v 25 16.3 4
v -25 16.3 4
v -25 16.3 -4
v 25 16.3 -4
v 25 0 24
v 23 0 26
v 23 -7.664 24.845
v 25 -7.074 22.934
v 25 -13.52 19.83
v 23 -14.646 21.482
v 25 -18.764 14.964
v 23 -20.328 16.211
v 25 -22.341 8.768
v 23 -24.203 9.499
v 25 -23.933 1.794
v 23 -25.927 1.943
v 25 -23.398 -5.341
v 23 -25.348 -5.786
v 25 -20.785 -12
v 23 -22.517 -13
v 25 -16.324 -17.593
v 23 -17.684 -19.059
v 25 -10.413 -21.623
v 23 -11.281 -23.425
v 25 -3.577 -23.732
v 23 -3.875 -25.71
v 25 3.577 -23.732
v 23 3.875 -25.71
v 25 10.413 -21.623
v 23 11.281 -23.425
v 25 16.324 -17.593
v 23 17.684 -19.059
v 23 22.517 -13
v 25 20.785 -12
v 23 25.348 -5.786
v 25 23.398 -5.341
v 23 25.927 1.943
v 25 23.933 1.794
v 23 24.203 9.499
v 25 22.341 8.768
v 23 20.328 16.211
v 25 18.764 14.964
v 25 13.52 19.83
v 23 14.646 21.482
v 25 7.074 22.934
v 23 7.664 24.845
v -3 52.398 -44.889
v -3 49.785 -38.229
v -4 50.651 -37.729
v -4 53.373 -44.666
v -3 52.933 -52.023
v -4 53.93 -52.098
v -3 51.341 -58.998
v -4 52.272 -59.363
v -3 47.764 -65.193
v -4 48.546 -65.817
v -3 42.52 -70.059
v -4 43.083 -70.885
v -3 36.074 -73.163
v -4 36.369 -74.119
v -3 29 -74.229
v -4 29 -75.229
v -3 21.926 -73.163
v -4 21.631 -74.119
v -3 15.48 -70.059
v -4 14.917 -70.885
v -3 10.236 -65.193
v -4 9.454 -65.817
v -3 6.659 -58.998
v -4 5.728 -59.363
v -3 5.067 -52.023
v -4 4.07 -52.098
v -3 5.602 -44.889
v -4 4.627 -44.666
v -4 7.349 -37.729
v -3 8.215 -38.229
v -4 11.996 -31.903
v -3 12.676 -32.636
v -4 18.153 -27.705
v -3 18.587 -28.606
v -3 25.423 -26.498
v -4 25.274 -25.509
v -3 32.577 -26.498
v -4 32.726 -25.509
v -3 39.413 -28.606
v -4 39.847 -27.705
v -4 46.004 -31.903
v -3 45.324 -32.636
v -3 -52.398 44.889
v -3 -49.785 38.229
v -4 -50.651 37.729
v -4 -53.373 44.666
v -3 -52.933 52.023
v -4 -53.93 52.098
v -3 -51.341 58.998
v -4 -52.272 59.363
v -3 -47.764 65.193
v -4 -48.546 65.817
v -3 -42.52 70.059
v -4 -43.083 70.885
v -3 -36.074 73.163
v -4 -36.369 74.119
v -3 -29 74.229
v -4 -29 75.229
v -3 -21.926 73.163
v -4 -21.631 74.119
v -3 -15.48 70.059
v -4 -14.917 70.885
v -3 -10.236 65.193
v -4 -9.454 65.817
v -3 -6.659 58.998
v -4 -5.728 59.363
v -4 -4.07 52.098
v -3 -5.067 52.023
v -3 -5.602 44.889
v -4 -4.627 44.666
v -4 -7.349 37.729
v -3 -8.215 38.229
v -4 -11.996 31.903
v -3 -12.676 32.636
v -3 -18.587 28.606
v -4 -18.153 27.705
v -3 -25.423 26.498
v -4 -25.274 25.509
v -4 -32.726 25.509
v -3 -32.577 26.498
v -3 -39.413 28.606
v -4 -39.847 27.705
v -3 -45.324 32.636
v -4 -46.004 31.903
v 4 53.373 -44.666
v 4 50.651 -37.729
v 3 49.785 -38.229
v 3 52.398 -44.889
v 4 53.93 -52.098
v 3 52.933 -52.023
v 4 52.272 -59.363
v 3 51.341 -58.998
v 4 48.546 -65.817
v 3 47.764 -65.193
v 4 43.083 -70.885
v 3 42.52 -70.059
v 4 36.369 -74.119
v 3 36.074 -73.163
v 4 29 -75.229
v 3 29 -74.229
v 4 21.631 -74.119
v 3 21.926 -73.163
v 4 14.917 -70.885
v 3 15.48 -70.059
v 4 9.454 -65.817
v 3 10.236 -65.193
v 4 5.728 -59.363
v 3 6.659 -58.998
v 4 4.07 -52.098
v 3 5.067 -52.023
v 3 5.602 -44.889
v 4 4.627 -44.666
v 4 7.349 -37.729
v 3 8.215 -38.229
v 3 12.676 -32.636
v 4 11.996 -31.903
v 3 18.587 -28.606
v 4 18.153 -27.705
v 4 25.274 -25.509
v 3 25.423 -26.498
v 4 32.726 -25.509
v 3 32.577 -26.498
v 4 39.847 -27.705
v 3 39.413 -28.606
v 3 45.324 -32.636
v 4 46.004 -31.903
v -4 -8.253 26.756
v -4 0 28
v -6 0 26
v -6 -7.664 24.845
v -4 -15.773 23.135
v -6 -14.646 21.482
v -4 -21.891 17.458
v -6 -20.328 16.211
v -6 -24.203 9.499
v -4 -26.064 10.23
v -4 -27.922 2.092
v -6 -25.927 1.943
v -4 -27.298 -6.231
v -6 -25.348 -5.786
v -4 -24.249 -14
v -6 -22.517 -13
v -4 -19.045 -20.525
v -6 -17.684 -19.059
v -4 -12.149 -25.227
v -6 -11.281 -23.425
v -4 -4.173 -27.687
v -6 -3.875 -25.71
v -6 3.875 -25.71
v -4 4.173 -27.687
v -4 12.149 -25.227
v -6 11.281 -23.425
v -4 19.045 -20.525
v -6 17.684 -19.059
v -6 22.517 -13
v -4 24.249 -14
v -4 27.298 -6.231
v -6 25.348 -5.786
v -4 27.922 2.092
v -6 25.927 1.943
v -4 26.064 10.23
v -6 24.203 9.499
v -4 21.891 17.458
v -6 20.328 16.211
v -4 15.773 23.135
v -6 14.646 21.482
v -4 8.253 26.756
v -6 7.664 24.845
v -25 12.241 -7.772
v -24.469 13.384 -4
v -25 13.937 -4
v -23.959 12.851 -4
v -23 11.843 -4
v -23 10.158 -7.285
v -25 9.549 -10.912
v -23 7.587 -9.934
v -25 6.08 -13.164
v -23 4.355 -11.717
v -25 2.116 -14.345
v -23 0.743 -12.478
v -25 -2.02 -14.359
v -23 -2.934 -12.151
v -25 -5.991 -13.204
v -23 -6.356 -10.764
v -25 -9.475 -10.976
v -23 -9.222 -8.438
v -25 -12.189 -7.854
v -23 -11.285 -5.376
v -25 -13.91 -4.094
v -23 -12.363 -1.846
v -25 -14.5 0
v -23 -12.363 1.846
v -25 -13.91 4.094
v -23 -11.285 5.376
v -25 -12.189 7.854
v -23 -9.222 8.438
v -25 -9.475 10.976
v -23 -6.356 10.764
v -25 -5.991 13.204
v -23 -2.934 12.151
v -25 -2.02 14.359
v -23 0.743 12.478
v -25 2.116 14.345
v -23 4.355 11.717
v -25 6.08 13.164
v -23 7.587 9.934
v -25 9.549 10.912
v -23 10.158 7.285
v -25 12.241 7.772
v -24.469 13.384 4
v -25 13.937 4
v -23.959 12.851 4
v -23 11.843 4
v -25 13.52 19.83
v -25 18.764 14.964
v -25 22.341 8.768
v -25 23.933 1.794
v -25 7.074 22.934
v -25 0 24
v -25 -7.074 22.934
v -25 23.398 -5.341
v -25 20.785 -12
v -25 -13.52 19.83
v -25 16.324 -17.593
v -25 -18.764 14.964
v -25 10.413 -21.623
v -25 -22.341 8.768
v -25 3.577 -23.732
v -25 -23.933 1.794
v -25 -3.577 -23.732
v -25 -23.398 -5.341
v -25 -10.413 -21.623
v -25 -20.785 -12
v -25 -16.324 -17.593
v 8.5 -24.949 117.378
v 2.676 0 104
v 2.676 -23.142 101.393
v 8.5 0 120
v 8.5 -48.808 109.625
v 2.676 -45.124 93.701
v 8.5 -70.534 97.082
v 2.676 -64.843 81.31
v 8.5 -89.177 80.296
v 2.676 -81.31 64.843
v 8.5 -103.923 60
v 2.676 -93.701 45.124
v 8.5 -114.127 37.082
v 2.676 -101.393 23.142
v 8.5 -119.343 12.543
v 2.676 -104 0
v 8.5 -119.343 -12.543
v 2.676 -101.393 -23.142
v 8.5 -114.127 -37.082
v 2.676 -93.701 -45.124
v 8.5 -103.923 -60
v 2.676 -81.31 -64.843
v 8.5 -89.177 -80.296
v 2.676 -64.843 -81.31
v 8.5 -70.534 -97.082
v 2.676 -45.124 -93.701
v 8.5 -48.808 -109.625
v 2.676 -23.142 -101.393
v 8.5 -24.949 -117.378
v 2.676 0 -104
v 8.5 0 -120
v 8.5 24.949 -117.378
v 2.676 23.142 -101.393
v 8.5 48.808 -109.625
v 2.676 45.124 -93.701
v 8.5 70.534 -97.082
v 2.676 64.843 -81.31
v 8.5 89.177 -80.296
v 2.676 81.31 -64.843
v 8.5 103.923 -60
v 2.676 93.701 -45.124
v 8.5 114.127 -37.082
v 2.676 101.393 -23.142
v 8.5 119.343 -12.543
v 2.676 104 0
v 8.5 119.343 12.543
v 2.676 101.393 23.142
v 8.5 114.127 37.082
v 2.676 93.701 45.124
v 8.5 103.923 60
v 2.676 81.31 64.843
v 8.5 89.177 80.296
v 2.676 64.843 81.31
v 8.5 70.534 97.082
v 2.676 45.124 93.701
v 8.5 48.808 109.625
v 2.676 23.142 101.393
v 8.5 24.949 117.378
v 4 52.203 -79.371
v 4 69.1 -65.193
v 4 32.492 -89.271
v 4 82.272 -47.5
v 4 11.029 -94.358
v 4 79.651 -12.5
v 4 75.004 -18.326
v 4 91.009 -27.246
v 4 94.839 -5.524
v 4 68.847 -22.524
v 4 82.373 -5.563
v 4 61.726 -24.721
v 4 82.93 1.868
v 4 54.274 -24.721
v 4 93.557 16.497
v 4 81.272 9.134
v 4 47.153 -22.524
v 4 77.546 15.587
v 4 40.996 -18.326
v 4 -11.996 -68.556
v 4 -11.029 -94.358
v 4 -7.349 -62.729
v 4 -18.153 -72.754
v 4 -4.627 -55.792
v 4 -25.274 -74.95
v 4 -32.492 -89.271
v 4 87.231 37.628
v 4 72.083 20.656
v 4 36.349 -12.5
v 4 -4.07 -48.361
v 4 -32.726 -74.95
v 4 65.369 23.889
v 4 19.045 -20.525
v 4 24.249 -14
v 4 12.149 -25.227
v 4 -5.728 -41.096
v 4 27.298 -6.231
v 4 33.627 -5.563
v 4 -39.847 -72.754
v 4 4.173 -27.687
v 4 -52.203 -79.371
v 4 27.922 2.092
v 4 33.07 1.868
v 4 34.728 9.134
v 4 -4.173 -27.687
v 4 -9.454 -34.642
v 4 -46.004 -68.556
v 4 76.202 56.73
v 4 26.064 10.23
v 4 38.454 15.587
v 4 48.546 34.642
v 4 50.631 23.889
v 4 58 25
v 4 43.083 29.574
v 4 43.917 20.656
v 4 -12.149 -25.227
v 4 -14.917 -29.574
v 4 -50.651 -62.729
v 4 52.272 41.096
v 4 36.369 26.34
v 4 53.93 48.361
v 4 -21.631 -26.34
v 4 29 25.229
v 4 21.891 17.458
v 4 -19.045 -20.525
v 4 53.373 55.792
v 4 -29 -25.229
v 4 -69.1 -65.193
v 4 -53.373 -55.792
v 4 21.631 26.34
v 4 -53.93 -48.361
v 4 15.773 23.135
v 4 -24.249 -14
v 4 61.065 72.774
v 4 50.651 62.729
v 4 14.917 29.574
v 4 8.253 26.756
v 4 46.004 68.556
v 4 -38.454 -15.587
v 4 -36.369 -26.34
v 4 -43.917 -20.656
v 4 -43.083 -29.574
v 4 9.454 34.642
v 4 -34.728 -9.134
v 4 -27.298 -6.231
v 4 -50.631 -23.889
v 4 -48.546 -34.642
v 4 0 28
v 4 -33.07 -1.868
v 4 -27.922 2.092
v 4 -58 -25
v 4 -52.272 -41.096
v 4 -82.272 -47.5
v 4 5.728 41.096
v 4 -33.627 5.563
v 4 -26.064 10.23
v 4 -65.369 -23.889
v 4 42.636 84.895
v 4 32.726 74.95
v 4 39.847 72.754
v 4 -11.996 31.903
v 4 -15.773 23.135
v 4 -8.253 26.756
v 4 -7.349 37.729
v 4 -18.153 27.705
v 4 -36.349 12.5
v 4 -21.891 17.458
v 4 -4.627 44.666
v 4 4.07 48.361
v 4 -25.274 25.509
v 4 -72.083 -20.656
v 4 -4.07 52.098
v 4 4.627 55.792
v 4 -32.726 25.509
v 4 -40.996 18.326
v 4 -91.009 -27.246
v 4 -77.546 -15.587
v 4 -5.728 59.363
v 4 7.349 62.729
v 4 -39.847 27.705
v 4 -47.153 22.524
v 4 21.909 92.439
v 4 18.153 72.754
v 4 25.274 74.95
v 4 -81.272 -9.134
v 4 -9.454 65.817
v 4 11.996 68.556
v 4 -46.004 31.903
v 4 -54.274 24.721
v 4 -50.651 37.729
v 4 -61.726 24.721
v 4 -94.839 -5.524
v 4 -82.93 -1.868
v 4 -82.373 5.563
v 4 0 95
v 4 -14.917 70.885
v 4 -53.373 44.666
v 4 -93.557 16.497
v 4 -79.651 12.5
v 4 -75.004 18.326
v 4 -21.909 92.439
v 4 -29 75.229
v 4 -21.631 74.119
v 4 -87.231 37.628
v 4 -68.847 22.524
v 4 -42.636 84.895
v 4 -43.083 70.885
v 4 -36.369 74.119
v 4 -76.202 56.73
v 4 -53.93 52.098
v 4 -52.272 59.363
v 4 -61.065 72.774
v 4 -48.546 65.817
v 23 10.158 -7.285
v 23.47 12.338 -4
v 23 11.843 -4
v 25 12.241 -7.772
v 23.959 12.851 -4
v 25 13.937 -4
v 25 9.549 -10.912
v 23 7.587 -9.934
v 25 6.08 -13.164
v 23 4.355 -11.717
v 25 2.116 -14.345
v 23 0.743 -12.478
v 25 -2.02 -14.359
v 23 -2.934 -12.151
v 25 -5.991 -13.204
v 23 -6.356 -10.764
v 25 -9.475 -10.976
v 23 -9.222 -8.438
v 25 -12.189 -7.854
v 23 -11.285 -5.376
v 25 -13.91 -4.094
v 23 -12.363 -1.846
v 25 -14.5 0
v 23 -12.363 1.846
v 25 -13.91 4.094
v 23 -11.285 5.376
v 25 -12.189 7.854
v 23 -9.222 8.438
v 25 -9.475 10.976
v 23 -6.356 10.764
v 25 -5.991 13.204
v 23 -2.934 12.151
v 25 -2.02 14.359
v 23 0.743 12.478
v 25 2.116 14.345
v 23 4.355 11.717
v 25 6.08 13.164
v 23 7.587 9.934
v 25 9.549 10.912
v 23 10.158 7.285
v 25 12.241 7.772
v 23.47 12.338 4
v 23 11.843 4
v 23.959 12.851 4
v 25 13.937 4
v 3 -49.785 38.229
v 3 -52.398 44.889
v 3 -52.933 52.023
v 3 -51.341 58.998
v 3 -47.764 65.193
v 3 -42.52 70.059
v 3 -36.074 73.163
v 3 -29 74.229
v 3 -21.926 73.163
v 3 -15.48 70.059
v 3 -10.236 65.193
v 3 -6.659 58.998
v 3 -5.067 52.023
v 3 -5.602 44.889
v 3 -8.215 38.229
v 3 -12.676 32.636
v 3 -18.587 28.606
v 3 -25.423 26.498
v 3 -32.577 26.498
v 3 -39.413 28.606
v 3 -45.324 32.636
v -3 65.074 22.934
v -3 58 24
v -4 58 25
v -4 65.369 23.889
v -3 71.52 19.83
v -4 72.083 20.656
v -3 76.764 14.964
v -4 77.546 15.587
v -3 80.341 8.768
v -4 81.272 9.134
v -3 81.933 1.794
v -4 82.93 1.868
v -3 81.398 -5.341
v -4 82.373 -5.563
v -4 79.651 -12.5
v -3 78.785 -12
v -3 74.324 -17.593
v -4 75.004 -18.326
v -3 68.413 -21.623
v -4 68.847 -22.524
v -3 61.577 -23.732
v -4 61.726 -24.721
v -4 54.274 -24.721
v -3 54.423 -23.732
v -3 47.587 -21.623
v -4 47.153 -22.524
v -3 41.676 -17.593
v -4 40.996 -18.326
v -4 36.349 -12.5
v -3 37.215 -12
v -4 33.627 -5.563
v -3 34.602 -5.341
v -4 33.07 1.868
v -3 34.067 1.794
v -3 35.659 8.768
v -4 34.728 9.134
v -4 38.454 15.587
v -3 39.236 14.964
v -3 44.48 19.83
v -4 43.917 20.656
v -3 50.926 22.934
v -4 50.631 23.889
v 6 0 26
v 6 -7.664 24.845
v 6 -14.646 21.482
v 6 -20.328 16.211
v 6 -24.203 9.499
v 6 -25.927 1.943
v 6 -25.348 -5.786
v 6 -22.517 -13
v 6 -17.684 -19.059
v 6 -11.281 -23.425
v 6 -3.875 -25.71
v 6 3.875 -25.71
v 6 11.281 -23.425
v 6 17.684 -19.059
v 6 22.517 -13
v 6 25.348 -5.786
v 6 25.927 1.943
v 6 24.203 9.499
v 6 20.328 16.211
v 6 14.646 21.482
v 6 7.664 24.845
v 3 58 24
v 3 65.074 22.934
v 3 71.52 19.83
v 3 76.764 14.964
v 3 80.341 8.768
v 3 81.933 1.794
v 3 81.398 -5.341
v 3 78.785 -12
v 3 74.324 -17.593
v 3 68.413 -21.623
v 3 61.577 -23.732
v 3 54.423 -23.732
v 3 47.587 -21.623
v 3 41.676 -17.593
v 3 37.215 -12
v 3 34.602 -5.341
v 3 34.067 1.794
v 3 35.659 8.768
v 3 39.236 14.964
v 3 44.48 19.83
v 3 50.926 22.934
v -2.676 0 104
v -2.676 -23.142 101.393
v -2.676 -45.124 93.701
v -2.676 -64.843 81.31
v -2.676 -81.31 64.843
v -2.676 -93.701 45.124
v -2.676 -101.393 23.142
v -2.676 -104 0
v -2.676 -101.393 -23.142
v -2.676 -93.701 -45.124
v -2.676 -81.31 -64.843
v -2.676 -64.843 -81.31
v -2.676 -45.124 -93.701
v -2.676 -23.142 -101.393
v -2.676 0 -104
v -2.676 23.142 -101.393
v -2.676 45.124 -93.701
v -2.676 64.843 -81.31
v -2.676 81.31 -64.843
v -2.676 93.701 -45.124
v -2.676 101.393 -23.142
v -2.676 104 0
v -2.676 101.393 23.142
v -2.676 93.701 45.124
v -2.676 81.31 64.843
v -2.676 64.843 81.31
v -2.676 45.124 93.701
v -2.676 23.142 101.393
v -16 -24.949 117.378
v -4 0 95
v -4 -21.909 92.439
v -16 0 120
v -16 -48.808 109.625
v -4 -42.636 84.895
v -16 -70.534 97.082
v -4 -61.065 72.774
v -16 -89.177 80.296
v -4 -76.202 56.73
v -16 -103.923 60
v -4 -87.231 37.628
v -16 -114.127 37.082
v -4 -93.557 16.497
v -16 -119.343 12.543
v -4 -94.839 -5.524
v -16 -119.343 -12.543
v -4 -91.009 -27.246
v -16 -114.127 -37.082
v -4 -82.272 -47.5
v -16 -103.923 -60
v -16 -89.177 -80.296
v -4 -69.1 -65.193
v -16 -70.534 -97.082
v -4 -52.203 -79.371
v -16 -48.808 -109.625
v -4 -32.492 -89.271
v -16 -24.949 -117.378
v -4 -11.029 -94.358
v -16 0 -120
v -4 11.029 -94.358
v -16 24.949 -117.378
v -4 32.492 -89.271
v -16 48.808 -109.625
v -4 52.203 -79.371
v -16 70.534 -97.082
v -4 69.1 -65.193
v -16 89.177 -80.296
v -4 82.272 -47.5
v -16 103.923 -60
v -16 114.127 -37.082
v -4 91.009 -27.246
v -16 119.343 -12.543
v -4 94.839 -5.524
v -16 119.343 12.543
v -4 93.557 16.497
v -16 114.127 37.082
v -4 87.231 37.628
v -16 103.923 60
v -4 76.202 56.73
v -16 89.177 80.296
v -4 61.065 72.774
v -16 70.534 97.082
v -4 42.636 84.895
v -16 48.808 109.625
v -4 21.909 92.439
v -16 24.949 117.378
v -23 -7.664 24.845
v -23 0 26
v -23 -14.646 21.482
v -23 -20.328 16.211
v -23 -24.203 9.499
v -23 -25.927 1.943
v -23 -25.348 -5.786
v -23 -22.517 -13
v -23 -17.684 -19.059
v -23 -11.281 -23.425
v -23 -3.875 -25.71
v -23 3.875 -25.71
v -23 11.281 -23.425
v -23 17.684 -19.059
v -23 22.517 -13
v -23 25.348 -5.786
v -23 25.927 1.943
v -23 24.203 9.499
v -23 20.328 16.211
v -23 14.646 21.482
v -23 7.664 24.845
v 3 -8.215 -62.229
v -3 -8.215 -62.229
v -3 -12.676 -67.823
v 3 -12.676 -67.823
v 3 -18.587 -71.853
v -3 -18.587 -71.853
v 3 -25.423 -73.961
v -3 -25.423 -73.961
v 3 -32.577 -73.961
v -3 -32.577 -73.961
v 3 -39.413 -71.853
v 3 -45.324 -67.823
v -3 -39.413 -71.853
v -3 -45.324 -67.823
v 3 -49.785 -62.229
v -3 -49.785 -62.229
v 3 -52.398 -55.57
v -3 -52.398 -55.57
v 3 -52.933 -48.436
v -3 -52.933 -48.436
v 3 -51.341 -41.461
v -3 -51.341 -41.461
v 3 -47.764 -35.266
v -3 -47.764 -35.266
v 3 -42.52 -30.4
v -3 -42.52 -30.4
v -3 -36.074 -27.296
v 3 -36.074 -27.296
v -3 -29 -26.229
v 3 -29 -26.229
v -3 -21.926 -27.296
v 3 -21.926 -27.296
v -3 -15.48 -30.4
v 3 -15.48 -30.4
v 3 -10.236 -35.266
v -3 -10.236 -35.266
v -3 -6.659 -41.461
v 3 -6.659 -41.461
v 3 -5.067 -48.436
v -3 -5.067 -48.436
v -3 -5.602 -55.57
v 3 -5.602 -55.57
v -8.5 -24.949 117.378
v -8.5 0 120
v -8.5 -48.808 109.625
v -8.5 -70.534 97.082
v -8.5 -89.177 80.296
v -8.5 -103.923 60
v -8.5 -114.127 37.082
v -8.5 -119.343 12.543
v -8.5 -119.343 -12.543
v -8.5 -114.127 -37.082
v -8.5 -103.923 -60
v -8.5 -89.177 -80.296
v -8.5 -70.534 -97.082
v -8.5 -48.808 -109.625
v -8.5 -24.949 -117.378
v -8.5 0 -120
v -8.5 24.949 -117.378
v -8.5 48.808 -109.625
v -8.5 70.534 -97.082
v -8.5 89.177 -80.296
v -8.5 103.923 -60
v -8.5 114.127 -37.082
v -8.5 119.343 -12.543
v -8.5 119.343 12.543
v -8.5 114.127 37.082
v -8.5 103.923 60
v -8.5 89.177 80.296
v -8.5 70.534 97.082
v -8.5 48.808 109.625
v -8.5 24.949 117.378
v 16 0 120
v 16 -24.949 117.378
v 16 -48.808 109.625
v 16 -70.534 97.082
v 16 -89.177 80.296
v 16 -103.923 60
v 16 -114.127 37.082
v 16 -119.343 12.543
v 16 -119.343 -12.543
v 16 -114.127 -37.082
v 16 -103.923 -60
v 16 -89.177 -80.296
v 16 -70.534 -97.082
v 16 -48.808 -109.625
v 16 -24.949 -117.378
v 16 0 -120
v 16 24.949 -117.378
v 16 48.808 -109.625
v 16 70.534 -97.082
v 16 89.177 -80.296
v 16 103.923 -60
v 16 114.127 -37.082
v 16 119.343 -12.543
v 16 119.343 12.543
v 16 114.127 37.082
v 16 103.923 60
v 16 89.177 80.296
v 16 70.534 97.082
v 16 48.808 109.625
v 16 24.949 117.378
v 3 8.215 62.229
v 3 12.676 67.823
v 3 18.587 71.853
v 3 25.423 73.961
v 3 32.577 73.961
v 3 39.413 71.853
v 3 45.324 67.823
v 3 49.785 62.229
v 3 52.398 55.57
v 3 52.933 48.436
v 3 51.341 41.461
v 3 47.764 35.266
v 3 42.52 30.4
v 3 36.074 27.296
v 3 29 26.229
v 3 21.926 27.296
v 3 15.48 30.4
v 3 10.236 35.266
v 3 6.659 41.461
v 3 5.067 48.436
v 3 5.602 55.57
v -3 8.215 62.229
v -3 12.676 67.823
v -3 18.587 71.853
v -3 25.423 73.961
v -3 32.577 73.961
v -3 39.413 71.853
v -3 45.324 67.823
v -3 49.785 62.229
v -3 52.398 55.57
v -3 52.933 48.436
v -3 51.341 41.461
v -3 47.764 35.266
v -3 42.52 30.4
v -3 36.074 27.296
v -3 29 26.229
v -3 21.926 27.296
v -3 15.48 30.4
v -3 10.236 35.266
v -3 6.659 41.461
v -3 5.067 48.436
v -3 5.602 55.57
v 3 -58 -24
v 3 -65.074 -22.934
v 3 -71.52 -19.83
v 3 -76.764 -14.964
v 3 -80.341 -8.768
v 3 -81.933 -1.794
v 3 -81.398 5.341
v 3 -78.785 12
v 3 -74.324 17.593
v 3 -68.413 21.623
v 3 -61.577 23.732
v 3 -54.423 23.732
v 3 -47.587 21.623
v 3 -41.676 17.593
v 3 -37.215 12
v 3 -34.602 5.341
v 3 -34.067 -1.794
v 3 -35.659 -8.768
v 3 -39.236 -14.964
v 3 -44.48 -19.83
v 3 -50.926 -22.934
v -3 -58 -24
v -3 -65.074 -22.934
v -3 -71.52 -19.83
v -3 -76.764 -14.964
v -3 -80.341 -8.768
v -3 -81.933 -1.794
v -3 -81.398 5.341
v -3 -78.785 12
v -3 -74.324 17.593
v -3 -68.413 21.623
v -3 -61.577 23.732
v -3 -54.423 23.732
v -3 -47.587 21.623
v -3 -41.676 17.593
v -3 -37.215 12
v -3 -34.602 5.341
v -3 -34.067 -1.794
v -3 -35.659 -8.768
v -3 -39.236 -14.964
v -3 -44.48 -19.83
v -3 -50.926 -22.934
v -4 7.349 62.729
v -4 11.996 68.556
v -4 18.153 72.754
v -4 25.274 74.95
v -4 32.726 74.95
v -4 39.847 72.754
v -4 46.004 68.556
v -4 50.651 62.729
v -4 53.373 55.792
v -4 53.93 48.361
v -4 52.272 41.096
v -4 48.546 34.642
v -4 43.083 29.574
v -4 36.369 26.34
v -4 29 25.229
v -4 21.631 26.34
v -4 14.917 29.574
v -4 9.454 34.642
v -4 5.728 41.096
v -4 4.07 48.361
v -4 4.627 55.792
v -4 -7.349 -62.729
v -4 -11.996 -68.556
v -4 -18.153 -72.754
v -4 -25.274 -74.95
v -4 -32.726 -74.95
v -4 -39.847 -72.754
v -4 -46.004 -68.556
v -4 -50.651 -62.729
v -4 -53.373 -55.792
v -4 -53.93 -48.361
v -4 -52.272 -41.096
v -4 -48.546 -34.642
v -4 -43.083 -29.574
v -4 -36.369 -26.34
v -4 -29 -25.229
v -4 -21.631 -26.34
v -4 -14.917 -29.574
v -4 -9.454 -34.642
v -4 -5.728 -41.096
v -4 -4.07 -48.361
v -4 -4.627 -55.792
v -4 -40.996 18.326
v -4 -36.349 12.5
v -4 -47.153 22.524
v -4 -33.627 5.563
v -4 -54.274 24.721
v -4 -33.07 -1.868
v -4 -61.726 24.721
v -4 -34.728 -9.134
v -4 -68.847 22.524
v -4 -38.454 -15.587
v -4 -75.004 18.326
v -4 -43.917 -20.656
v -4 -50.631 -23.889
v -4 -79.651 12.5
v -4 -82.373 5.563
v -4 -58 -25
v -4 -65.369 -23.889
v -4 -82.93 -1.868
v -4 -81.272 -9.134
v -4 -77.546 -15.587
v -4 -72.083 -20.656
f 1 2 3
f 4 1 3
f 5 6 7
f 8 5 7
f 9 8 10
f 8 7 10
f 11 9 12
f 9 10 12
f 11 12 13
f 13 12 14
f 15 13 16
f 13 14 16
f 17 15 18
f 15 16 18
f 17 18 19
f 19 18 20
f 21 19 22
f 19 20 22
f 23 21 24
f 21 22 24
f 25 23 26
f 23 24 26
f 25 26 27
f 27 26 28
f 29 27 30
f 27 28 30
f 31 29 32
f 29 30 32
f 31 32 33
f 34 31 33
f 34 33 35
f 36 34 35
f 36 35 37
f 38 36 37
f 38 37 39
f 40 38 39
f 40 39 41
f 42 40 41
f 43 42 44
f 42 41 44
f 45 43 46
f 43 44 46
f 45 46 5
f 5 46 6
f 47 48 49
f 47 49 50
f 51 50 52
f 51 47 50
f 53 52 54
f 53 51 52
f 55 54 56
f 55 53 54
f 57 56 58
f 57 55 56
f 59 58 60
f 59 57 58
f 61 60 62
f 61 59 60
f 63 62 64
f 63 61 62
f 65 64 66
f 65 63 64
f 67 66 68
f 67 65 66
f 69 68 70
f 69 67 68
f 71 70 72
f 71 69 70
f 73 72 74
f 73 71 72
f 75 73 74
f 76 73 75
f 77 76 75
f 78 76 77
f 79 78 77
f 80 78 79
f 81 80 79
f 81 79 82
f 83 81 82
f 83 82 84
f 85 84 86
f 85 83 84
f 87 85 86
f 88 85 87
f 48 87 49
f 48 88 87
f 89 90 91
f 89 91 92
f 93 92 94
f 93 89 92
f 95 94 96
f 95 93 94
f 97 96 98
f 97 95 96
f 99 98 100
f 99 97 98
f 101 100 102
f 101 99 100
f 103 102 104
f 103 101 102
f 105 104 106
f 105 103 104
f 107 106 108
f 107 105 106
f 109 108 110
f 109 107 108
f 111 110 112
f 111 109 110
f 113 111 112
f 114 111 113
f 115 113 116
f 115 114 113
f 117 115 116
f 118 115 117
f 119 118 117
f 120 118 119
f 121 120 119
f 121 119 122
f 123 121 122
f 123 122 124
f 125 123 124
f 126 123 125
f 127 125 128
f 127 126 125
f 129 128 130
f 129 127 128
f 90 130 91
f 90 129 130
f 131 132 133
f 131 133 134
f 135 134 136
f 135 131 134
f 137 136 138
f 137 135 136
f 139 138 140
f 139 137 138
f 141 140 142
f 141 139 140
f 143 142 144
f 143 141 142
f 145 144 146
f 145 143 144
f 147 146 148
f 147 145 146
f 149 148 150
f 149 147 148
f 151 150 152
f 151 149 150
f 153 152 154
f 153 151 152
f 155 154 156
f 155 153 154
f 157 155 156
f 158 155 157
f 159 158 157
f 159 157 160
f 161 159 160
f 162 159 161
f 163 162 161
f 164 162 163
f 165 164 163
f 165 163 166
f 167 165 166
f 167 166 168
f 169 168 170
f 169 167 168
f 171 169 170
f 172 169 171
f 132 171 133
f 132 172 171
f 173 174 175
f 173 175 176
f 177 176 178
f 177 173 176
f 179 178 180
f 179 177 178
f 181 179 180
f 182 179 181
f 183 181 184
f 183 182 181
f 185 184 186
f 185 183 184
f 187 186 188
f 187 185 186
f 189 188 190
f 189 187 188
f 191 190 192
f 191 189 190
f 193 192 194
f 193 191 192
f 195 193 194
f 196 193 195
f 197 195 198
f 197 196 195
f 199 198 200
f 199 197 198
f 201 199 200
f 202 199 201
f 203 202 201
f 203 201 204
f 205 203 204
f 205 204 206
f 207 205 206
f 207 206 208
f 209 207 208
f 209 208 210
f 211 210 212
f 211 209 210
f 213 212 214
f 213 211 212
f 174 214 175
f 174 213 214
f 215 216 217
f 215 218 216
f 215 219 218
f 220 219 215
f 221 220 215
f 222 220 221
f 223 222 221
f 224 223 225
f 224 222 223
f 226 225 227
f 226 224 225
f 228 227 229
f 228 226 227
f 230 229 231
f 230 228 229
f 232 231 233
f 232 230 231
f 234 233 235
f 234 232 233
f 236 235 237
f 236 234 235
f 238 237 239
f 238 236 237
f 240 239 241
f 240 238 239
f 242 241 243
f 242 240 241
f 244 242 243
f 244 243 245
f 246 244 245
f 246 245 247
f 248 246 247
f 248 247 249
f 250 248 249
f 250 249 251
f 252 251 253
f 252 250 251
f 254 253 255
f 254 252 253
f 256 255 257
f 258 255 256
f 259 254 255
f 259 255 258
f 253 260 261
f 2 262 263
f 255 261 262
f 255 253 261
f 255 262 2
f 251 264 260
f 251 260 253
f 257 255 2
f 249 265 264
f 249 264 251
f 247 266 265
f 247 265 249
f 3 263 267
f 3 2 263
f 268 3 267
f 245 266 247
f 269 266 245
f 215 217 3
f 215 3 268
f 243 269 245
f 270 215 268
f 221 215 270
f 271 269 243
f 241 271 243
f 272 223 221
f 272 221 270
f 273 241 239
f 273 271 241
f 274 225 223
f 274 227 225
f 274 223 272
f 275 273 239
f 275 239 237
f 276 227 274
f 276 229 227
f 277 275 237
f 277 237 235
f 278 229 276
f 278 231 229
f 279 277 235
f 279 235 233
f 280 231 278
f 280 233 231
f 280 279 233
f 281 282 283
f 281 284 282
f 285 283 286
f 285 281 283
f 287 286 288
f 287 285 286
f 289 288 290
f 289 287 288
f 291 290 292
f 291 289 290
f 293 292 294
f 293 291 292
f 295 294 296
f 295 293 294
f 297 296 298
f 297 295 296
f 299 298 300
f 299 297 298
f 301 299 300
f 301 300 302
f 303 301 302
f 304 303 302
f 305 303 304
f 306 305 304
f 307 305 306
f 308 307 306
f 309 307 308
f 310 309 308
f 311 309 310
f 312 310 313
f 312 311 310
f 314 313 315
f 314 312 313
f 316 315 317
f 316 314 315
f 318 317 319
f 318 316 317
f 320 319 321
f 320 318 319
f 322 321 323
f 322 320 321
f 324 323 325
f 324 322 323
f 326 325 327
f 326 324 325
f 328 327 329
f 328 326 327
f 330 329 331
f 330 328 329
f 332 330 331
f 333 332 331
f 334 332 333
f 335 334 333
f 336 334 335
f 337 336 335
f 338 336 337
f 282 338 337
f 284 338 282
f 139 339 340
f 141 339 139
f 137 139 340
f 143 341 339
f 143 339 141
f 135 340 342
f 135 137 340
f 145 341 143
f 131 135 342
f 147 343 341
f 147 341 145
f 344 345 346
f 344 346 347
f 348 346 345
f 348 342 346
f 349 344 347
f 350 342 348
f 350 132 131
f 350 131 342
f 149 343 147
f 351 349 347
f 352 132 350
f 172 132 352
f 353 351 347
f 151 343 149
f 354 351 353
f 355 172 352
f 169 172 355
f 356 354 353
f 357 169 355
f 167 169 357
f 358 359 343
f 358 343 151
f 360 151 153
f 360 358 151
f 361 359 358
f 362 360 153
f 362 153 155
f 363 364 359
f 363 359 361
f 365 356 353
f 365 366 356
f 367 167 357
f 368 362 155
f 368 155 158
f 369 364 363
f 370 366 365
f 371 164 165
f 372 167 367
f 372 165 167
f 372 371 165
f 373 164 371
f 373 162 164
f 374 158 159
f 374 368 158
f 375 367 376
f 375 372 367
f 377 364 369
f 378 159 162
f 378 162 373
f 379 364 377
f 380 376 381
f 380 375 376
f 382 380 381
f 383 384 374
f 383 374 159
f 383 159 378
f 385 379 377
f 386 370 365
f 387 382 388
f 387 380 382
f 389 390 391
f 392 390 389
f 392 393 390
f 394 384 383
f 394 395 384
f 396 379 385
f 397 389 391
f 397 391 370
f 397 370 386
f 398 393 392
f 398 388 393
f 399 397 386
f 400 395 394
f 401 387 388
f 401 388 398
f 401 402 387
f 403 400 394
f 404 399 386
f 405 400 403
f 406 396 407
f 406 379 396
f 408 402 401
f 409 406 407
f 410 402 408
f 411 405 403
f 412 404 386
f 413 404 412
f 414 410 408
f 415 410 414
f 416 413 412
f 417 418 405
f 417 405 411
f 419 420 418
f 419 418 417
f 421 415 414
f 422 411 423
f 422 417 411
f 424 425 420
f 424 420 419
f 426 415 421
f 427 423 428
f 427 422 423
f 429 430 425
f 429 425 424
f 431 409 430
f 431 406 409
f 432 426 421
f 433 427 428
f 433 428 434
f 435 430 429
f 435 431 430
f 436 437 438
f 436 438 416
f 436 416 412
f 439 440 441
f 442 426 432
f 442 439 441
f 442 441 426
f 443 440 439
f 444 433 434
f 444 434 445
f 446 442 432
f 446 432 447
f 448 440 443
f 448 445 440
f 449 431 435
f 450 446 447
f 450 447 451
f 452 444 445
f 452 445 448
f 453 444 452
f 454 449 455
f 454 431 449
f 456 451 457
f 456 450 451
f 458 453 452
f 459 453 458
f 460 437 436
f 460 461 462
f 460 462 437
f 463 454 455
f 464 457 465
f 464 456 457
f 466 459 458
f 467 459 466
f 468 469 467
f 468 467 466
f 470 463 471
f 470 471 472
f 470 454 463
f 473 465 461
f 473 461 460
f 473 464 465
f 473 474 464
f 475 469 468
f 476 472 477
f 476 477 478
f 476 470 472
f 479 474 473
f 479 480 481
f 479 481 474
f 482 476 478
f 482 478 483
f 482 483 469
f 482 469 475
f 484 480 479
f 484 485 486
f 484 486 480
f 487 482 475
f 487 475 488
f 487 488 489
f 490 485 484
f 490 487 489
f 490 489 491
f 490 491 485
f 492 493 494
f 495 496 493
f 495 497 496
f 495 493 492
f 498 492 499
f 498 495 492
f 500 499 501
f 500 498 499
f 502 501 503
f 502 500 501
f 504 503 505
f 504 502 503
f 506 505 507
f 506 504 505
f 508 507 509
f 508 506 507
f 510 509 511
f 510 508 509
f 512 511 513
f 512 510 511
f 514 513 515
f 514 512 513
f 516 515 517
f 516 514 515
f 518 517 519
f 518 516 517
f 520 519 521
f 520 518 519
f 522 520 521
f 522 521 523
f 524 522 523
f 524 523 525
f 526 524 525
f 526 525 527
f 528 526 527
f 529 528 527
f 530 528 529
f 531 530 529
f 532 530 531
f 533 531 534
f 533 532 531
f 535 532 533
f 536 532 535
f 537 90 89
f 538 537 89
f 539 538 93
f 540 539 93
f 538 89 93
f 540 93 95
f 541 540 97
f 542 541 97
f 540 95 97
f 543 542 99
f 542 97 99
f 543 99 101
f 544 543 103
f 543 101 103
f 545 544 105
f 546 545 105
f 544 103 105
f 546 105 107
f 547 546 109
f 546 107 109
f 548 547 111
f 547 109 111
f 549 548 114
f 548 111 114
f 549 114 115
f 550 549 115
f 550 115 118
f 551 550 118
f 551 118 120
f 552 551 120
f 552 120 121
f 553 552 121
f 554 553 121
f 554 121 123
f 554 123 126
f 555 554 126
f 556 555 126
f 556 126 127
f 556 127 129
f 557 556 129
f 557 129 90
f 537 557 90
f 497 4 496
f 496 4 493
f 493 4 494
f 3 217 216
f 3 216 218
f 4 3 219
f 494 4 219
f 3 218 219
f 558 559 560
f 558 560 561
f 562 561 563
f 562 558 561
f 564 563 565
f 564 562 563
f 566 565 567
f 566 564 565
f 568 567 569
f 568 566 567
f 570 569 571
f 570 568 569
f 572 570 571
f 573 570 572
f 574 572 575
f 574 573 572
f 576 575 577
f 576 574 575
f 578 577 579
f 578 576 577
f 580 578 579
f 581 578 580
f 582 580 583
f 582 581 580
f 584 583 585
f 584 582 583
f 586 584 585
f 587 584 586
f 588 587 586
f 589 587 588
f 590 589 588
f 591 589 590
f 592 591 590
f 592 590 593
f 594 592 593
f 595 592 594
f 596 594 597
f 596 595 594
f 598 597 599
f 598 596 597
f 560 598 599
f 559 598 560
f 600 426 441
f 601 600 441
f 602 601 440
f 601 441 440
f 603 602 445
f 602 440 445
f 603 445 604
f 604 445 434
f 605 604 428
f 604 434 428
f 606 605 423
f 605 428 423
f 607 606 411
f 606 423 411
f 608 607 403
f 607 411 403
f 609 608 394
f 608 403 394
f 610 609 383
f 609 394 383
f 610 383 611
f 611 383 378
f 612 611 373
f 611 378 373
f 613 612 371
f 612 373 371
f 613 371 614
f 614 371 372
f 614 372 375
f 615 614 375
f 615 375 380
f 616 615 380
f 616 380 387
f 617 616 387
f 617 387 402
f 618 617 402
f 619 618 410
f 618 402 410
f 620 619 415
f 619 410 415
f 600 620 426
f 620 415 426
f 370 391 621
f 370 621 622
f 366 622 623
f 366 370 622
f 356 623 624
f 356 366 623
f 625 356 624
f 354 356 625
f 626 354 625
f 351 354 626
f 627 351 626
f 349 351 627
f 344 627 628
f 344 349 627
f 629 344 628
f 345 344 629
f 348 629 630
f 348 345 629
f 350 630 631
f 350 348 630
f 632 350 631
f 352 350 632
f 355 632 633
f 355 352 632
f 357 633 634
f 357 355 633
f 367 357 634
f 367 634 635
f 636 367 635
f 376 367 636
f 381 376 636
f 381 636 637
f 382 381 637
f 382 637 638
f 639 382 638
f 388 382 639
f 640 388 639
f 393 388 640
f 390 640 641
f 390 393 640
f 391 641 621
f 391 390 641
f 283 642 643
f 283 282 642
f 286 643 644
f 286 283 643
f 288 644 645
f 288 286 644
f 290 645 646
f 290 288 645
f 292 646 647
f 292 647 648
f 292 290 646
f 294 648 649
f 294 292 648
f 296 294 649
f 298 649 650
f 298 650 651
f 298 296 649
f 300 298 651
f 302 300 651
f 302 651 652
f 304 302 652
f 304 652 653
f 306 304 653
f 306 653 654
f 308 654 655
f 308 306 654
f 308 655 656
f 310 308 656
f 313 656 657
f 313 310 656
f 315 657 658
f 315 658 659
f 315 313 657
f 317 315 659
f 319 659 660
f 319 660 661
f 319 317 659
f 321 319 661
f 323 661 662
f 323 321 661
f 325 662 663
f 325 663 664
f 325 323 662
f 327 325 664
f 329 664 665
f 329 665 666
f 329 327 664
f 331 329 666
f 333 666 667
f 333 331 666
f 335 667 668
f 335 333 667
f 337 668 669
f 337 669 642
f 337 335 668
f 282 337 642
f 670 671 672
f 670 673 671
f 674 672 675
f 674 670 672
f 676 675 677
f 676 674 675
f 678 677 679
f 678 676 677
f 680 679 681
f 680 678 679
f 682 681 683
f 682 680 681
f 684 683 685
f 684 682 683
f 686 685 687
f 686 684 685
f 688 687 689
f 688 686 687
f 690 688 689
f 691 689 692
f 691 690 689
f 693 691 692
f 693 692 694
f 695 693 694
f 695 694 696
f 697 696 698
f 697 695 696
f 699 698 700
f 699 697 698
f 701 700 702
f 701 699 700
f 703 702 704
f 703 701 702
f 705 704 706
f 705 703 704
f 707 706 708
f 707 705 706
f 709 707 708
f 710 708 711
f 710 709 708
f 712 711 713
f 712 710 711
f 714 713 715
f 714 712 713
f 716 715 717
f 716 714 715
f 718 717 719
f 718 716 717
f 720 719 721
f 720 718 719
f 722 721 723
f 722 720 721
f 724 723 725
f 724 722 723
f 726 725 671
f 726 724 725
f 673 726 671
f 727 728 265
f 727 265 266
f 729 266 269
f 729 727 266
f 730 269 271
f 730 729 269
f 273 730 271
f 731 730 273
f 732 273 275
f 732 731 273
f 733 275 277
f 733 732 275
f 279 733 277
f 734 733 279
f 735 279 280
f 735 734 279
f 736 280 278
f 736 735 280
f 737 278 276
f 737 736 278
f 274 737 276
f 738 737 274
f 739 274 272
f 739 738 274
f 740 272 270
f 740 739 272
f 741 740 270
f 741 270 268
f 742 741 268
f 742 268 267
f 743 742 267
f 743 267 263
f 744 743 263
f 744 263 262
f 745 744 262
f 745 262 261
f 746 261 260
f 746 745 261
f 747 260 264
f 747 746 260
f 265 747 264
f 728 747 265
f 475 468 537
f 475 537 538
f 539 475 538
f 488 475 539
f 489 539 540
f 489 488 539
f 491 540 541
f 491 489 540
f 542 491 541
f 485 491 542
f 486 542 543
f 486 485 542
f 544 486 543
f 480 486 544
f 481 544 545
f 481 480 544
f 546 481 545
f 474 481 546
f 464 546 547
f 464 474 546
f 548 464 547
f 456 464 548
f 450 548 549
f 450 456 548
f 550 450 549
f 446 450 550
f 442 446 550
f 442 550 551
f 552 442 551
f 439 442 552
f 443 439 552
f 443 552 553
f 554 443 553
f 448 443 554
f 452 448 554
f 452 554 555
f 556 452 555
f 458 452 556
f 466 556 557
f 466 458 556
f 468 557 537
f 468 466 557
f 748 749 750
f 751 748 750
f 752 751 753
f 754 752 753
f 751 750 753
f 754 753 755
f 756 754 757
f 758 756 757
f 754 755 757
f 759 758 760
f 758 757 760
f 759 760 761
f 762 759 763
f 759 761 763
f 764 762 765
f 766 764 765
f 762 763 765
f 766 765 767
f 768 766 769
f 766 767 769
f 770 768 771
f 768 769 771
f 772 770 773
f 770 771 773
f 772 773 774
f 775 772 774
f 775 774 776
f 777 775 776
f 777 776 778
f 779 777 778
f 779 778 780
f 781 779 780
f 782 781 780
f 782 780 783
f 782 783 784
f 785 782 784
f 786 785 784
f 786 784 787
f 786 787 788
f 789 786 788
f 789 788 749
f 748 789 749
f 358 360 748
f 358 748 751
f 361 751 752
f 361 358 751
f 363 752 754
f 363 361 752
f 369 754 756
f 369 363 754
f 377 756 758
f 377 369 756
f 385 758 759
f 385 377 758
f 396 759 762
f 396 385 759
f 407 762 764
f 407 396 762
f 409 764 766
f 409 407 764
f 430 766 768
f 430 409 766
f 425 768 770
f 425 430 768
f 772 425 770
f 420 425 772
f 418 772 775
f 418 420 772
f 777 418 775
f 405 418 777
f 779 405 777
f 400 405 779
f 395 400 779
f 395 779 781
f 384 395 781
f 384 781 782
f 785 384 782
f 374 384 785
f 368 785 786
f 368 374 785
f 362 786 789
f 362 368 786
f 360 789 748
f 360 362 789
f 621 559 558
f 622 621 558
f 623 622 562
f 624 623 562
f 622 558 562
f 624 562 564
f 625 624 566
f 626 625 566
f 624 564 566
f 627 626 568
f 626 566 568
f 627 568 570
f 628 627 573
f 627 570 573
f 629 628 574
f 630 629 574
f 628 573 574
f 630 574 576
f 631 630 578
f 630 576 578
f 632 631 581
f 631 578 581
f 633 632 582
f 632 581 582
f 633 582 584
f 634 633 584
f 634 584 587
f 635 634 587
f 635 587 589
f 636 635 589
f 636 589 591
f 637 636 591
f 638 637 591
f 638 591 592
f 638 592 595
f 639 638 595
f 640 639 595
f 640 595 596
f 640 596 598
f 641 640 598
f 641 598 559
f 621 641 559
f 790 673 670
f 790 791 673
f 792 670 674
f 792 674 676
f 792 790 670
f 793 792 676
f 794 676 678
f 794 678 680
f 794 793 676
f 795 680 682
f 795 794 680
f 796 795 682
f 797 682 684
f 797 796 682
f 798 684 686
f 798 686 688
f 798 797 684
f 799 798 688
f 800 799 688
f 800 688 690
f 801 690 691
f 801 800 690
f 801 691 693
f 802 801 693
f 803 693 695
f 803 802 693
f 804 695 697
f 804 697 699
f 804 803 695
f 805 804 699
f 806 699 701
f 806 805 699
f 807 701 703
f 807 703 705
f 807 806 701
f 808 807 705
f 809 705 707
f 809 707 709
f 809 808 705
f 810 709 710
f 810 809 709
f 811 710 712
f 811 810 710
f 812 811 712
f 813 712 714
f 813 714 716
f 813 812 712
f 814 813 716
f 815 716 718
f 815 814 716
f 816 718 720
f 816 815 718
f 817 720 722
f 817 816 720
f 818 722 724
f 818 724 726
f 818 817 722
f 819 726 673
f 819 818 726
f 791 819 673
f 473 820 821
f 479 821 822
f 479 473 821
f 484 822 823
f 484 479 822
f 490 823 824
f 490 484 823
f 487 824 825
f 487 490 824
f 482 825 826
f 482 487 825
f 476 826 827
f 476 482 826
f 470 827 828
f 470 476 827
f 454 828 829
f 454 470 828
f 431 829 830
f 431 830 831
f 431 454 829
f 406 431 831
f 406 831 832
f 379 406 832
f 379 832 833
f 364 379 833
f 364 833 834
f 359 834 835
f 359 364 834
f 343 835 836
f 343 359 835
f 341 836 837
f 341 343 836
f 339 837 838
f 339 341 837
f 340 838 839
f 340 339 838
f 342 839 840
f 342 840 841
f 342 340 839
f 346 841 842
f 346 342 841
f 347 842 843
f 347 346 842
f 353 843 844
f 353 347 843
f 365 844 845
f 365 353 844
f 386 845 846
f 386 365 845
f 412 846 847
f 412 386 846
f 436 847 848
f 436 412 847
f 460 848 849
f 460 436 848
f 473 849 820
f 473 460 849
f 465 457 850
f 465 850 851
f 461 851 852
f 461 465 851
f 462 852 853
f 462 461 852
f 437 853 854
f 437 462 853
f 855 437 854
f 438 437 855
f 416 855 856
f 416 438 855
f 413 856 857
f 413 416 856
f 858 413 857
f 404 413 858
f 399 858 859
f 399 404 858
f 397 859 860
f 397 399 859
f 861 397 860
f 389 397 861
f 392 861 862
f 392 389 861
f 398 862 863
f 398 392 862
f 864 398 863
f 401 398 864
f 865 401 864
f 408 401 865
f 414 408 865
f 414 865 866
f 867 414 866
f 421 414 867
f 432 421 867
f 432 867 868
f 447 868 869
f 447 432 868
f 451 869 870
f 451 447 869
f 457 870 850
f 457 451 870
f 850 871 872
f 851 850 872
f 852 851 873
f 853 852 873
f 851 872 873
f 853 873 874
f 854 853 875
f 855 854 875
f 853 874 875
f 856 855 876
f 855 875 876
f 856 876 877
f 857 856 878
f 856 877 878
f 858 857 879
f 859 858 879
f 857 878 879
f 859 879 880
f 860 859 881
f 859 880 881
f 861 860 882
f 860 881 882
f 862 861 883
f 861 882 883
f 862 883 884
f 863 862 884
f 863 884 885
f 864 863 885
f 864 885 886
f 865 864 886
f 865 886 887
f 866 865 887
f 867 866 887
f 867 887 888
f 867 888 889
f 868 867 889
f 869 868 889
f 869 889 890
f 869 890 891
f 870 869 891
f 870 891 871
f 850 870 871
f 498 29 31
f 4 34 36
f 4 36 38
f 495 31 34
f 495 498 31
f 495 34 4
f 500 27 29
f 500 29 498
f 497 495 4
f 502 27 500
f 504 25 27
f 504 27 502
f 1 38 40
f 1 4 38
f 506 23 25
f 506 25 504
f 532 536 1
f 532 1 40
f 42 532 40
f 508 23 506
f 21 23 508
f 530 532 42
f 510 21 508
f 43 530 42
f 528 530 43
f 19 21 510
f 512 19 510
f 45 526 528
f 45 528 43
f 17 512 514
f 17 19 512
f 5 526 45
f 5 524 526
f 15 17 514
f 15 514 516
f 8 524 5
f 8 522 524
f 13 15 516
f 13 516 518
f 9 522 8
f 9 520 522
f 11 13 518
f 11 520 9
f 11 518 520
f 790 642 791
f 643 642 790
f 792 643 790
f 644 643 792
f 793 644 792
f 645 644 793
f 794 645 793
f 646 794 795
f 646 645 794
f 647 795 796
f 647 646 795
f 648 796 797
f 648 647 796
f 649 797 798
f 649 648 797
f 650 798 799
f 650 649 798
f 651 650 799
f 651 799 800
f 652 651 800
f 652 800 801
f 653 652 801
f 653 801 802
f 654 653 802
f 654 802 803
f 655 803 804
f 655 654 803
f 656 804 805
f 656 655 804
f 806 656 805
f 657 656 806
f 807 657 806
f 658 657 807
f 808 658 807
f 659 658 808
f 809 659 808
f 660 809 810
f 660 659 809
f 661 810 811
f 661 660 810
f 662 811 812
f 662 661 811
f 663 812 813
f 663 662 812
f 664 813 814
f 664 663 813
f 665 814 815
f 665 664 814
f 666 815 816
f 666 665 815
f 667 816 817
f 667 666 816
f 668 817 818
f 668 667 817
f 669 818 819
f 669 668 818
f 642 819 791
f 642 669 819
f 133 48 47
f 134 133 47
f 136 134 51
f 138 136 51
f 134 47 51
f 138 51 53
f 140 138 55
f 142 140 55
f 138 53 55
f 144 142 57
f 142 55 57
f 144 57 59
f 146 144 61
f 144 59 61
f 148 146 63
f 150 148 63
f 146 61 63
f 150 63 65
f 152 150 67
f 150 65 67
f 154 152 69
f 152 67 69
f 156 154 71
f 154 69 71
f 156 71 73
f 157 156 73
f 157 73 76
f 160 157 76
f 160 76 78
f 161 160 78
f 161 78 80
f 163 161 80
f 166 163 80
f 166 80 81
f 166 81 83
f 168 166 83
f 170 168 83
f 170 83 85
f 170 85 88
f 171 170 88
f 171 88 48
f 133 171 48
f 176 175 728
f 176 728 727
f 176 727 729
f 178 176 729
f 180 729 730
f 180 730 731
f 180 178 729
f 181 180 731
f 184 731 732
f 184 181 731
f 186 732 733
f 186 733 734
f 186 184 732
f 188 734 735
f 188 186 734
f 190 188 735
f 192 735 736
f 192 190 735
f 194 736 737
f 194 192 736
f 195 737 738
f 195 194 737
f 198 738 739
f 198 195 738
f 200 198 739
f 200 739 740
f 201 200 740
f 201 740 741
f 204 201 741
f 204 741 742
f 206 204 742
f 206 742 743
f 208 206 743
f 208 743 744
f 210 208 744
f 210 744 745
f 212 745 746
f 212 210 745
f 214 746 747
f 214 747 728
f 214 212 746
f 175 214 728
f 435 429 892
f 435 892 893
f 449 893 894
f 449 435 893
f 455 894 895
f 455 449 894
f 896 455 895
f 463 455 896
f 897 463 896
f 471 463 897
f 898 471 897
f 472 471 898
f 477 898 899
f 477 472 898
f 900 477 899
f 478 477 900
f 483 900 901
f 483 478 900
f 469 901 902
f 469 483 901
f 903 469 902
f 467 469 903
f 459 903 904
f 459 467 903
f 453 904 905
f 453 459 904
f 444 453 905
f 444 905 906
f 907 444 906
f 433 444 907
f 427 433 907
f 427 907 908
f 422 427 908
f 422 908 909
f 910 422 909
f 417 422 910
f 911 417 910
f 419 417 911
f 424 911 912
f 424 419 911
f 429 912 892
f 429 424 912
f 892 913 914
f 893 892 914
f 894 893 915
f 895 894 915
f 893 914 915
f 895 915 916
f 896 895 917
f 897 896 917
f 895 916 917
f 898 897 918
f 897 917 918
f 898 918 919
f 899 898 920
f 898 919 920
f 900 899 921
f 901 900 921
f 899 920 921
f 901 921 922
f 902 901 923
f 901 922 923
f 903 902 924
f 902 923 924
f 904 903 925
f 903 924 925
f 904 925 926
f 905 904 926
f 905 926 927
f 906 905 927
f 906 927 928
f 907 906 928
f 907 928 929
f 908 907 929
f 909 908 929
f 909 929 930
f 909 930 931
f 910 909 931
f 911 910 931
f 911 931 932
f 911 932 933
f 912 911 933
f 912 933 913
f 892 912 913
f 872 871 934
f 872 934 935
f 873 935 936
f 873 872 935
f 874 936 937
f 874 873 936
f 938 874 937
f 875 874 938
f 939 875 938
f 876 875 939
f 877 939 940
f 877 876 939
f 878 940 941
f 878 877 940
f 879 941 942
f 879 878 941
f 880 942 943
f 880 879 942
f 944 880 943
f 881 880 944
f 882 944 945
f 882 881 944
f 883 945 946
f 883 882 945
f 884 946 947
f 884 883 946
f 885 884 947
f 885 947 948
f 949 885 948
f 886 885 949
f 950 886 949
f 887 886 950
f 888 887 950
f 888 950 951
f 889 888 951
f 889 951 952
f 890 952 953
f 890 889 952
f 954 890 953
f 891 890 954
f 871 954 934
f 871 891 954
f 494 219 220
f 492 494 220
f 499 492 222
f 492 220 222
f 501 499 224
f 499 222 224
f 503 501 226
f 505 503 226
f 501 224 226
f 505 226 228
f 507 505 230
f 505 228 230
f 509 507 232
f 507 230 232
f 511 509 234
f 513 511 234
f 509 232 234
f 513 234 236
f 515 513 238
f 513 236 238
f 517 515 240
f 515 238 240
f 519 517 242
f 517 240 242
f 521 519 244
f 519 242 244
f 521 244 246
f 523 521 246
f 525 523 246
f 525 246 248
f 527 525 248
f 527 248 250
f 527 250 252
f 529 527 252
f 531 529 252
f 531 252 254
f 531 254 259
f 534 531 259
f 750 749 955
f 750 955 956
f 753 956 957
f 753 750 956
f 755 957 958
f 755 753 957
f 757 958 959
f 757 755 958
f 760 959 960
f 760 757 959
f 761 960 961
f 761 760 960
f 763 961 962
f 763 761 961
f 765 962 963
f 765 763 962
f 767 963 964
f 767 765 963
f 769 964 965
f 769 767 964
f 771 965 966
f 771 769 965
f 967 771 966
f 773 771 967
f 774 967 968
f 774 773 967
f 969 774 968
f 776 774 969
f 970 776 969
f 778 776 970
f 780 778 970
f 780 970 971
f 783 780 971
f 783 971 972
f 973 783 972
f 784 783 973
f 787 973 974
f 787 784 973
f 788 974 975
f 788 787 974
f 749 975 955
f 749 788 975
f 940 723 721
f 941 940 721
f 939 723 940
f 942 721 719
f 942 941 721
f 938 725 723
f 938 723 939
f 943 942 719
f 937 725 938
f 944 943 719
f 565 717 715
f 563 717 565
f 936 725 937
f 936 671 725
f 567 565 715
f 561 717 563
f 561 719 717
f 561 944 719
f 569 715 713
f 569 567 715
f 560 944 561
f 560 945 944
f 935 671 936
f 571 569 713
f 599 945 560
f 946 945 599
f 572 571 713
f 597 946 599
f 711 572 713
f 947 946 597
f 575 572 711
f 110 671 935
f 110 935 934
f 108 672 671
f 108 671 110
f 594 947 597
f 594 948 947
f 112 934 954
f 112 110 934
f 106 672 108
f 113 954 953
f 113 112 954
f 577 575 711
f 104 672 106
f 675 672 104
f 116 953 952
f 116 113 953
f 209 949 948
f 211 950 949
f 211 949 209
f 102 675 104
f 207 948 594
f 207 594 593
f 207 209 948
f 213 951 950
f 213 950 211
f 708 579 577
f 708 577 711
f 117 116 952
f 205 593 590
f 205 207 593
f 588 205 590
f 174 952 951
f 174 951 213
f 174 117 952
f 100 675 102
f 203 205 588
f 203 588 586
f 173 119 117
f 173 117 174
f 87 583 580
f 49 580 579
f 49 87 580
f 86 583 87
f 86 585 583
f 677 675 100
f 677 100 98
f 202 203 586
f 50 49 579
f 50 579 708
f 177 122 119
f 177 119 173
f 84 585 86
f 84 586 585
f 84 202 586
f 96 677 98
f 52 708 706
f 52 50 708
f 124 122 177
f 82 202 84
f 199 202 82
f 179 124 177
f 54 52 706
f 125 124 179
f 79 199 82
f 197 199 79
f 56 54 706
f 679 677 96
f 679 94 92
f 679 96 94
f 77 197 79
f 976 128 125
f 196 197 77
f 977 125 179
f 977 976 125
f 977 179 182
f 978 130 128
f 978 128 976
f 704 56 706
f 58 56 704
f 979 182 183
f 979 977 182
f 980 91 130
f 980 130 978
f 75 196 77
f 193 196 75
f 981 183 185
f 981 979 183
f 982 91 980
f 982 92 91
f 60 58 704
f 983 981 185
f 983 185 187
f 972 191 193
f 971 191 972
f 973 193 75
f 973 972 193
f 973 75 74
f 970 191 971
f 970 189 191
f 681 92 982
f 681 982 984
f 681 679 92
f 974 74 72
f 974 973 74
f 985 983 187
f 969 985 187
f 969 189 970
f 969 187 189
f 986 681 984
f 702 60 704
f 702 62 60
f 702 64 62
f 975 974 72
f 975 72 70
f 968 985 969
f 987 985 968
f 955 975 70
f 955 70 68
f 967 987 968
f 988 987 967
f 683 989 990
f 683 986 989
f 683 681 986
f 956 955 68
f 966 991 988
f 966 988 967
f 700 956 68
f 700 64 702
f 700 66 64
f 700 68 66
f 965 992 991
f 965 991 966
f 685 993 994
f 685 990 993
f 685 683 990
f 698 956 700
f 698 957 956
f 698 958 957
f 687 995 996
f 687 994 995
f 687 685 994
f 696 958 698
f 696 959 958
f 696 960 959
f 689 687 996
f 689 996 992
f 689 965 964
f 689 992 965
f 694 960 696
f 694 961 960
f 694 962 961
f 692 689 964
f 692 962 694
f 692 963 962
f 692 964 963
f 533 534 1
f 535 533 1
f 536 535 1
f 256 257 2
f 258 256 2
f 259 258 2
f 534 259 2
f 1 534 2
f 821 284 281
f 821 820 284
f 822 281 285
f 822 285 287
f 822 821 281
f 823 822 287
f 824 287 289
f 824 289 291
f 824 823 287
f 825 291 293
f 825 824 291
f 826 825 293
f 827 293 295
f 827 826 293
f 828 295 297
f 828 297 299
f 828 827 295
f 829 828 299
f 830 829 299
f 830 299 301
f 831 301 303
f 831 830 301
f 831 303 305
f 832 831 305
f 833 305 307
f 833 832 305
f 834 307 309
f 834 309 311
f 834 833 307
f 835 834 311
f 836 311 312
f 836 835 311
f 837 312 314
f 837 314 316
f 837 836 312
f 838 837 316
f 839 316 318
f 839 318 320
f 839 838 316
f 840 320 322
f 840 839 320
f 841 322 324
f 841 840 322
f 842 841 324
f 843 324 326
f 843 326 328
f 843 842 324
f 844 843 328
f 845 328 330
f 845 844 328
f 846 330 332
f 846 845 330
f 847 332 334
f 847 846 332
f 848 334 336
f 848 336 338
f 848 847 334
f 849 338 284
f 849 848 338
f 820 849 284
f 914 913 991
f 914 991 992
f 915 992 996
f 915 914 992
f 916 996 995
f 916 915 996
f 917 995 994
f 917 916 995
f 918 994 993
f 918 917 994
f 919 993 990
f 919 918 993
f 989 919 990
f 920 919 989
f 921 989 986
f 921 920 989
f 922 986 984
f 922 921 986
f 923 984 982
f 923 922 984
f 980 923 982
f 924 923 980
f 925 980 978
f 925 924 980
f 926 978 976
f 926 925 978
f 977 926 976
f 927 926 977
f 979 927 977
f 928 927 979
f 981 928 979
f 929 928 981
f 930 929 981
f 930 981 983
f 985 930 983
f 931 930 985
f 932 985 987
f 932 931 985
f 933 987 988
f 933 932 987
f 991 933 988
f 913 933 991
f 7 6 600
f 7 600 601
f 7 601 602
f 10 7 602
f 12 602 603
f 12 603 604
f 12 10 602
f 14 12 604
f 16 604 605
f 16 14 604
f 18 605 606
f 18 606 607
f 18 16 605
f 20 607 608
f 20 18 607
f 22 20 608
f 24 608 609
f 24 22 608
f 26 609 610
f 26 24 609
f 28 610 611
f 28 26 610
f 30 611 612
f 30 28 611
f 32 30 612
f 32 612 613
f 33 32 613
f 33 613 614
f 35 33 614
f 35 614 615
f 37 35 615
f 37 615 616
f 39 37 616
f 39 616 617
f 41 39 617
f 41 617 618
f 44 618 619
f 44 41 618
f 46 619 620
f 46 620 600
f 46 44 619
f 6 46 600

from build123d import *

# Parameters (mm, degrees)
WYTNIJ_WYCI_GNI_CIE1_REACH       = 178.918
SFAZOWANIE2_SIZE                 = 2
SFAZOWANIE3_SIZE                 = 2
WYTNIJ_WYCI_GNI_CIE2_REACH       = 174.166
SZKIC3_R                         = 24
SFAZOWANIE4_SIZE                 = 1
SZYK_KO_OWY2_COUNT               = 6
SFAZOWANIE4_OF_SZYK_KO_OWY2_SIZE = 1


with BuildPart() as part:
    # Szkic1 → Obrót2 (revolve)
    with BuildSketch(Plane.XY):
        Polygon((-4, 95), (-16, 120), (-8.5, 120), (-2.676476252, 104), (2.676476252, 104), (8.5, 120), (16, 120), (4, 95), (4, 26), (25, 26), (25, 0), (-25, 0), (-25, 26), (-4, 26), align=None)
    revolve(axis=Axis((-76.201663435, 0, 0), (1, 0, 0)))

    # Szkic2 → Wytnij-wyciągnięcie1 (cut, up to next)
    with BuildSketch(Plane.ZY.offset(25), mode=Mode.PRIVATE) as wytnij_wyci_gni_cie1_sk1:
        with BuildLine():
            Line((4, 11.842719282), (4, 16.3))
            Line((4, 16.3), (-4, 16.3))
            Line((-4, 16.3), (-4, 11.842719282))
            ThreePointArc((-4, 11.842719282), (0, -12.5), (4, 11.842719282))
        make_face()
    wytnij_wyci_gni_cie1_tool1 = extrude(wytnij_wyci_gni_cie1_sk1.sketch, amount=-WYTNIJ_WYCI_GNI_CIE1_REACH, mode=Mode.PRIVATE) & part.part
    add(wytnij_wyci_gni_cie1_tool1.solids().sort_by_distance((-25, 0.877795, 0))[0], mode=Mode.SUBTRACT)

    # Sfazowanie2
    sfazowanie2_edges = [part.edges().sort_by_distance(p)[0] for p in [
        (-25, -12.5, 0),
        (25, -12.5, 0),
    ]]
    chamfer(sfazowanie2_edges, length=SFAZOWANIE2_SIZE)

    # Sfazowanie3
    sfazowanie3_edges = [part.edges().sort_by_distance(p)[0] for p in [
        (-25, -26, 0),
        (-4, -26, 0),
        (25, -26, 0),
        (4, -26, 0),
    ]]
    chamfer(sfazowanie3_edges, length=SFAZOWANIE3_SIZE)

    # Szkic3 → Wytnij-wyciągnięcie2 (cut, up to next)
    with BuildSketch(Plane.ZY.offset(4), mode=Mode.PRIVATE) as wytnij_wyci_gni_cie2_sk1:
        with Locations((0, 58)):
            Circle(SZKIC3_R)
    wytnij_wyci_gni_cie2_tool1 = extrude(wytnij_wyci_gni_cie2_sk1.sketch, amount=-WYTNIJ_WYCI_GNI_CIE2_REACH, mode=Mode.PRIVATE) & part.part
    wytnij_wyci_gni_cie2 = wytnij_wyci_gni_cie2_tool1.solids().sort_by_distance((-4, 58, 0))[0]
    add(wytnij_wyci_gni_cie2, mode=Mode.SUBTRACT)

    # Sfazowanie4
    sfazowanie4_edges = [part.edges().sort_by_distance(p)[0] for p in [
        (-4, 58, -24),
        (4, 58, -24),
    ]]
    chamfer(sfazowanie4_edges, length=SFAZOWANIE4_SIZE)

    # Szyk kołowy2: Wytnij-wyciągnięcie2 ×6 about axis
    szyk_ko_owy2_axis = Axis((0, 0, 0), (-1, 0, 0))
    for i in range(1, SZYK_KO_OWY2_COUNT):
        add(wytnij_wyci_gni_cie2.rotate(szyk_ko_owy2_axis, i * 360 / SZYK_KO_OWY2_COUNT), mode=Mode.SUBTRACT)

    # Sfazowanie4 of Szyk kołowy2
    sfazowanie4_of_szyk_ko_owy2_edges = [part.edges().sort_by_distance(p)[0] for p in [
        (-4, 8.215390309, -62.229473419),
        (4, 8.215390309, -62.229473419),
        (-4, -49.784609691, -38.229473419),
        (4, -49.784609691, -38.229473419),
        (-4, -58, 24),
        (4, -58, 24),
        (-4, -8.215390309, 62.229473419),
        (4, -8.215390309, 62.229473419),
        (-4, 49.784609691, 38.229473419),
        (4, 49.784609691, 38.229473419),
    ]]
    chamfer(sfazowanie4_of_szyk_ko_owy2_edges, length=SFAZOWANIE4_OF_SZYK_KO_OWY2_SIZE)


solid = part.part
